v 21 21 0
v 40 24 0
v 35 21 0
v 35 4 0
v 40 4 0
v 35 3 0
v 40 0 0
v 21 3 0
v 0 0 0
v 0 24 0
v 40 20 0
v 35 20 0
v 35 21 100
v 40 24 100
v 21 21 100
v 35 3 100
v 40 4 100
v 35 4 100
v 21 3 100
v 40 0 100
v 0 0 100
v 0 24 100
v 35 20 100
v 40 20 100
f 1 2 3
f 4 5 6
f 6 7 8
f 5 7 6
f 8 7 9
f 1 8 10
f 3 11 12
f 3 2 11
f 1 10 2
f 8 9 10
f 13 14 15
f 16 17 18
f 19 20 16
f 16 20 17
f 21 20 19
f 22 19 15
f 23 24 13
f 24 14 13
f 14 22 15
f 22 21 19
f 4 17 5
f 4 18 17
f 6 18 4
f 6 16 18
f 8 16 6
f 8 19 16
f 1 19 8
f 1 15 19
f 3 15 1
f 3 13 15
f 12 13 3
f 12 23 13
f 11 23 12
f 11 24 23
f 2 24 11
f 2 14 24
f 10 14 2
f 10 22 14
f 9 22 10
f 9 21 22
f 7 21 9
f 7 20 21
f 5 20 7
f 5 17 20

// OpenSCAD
$fn = 32;

// ----------------------------------------------------------------------
// T-slot rail: 40 x 24 mm section, 100 mm long
// ----------------------------------------------------------------------

// --- parameters (mm) ---
profile_height = 100;     // extrusion height
profile_points = 12;      // points of the closed outline

profile = [[0, 0], [40, 0], [40, 4], [35, 4], [35, 3], [21, 3], [21, 21], [35, 21], [35, 20], [40, 20], [40, 24], [0, 24]];  // single closed polygon, 12 points, counter clockwise

// --- the one profile operation ---
linear_extrude(height = profile_height) polygon(points = profile);
